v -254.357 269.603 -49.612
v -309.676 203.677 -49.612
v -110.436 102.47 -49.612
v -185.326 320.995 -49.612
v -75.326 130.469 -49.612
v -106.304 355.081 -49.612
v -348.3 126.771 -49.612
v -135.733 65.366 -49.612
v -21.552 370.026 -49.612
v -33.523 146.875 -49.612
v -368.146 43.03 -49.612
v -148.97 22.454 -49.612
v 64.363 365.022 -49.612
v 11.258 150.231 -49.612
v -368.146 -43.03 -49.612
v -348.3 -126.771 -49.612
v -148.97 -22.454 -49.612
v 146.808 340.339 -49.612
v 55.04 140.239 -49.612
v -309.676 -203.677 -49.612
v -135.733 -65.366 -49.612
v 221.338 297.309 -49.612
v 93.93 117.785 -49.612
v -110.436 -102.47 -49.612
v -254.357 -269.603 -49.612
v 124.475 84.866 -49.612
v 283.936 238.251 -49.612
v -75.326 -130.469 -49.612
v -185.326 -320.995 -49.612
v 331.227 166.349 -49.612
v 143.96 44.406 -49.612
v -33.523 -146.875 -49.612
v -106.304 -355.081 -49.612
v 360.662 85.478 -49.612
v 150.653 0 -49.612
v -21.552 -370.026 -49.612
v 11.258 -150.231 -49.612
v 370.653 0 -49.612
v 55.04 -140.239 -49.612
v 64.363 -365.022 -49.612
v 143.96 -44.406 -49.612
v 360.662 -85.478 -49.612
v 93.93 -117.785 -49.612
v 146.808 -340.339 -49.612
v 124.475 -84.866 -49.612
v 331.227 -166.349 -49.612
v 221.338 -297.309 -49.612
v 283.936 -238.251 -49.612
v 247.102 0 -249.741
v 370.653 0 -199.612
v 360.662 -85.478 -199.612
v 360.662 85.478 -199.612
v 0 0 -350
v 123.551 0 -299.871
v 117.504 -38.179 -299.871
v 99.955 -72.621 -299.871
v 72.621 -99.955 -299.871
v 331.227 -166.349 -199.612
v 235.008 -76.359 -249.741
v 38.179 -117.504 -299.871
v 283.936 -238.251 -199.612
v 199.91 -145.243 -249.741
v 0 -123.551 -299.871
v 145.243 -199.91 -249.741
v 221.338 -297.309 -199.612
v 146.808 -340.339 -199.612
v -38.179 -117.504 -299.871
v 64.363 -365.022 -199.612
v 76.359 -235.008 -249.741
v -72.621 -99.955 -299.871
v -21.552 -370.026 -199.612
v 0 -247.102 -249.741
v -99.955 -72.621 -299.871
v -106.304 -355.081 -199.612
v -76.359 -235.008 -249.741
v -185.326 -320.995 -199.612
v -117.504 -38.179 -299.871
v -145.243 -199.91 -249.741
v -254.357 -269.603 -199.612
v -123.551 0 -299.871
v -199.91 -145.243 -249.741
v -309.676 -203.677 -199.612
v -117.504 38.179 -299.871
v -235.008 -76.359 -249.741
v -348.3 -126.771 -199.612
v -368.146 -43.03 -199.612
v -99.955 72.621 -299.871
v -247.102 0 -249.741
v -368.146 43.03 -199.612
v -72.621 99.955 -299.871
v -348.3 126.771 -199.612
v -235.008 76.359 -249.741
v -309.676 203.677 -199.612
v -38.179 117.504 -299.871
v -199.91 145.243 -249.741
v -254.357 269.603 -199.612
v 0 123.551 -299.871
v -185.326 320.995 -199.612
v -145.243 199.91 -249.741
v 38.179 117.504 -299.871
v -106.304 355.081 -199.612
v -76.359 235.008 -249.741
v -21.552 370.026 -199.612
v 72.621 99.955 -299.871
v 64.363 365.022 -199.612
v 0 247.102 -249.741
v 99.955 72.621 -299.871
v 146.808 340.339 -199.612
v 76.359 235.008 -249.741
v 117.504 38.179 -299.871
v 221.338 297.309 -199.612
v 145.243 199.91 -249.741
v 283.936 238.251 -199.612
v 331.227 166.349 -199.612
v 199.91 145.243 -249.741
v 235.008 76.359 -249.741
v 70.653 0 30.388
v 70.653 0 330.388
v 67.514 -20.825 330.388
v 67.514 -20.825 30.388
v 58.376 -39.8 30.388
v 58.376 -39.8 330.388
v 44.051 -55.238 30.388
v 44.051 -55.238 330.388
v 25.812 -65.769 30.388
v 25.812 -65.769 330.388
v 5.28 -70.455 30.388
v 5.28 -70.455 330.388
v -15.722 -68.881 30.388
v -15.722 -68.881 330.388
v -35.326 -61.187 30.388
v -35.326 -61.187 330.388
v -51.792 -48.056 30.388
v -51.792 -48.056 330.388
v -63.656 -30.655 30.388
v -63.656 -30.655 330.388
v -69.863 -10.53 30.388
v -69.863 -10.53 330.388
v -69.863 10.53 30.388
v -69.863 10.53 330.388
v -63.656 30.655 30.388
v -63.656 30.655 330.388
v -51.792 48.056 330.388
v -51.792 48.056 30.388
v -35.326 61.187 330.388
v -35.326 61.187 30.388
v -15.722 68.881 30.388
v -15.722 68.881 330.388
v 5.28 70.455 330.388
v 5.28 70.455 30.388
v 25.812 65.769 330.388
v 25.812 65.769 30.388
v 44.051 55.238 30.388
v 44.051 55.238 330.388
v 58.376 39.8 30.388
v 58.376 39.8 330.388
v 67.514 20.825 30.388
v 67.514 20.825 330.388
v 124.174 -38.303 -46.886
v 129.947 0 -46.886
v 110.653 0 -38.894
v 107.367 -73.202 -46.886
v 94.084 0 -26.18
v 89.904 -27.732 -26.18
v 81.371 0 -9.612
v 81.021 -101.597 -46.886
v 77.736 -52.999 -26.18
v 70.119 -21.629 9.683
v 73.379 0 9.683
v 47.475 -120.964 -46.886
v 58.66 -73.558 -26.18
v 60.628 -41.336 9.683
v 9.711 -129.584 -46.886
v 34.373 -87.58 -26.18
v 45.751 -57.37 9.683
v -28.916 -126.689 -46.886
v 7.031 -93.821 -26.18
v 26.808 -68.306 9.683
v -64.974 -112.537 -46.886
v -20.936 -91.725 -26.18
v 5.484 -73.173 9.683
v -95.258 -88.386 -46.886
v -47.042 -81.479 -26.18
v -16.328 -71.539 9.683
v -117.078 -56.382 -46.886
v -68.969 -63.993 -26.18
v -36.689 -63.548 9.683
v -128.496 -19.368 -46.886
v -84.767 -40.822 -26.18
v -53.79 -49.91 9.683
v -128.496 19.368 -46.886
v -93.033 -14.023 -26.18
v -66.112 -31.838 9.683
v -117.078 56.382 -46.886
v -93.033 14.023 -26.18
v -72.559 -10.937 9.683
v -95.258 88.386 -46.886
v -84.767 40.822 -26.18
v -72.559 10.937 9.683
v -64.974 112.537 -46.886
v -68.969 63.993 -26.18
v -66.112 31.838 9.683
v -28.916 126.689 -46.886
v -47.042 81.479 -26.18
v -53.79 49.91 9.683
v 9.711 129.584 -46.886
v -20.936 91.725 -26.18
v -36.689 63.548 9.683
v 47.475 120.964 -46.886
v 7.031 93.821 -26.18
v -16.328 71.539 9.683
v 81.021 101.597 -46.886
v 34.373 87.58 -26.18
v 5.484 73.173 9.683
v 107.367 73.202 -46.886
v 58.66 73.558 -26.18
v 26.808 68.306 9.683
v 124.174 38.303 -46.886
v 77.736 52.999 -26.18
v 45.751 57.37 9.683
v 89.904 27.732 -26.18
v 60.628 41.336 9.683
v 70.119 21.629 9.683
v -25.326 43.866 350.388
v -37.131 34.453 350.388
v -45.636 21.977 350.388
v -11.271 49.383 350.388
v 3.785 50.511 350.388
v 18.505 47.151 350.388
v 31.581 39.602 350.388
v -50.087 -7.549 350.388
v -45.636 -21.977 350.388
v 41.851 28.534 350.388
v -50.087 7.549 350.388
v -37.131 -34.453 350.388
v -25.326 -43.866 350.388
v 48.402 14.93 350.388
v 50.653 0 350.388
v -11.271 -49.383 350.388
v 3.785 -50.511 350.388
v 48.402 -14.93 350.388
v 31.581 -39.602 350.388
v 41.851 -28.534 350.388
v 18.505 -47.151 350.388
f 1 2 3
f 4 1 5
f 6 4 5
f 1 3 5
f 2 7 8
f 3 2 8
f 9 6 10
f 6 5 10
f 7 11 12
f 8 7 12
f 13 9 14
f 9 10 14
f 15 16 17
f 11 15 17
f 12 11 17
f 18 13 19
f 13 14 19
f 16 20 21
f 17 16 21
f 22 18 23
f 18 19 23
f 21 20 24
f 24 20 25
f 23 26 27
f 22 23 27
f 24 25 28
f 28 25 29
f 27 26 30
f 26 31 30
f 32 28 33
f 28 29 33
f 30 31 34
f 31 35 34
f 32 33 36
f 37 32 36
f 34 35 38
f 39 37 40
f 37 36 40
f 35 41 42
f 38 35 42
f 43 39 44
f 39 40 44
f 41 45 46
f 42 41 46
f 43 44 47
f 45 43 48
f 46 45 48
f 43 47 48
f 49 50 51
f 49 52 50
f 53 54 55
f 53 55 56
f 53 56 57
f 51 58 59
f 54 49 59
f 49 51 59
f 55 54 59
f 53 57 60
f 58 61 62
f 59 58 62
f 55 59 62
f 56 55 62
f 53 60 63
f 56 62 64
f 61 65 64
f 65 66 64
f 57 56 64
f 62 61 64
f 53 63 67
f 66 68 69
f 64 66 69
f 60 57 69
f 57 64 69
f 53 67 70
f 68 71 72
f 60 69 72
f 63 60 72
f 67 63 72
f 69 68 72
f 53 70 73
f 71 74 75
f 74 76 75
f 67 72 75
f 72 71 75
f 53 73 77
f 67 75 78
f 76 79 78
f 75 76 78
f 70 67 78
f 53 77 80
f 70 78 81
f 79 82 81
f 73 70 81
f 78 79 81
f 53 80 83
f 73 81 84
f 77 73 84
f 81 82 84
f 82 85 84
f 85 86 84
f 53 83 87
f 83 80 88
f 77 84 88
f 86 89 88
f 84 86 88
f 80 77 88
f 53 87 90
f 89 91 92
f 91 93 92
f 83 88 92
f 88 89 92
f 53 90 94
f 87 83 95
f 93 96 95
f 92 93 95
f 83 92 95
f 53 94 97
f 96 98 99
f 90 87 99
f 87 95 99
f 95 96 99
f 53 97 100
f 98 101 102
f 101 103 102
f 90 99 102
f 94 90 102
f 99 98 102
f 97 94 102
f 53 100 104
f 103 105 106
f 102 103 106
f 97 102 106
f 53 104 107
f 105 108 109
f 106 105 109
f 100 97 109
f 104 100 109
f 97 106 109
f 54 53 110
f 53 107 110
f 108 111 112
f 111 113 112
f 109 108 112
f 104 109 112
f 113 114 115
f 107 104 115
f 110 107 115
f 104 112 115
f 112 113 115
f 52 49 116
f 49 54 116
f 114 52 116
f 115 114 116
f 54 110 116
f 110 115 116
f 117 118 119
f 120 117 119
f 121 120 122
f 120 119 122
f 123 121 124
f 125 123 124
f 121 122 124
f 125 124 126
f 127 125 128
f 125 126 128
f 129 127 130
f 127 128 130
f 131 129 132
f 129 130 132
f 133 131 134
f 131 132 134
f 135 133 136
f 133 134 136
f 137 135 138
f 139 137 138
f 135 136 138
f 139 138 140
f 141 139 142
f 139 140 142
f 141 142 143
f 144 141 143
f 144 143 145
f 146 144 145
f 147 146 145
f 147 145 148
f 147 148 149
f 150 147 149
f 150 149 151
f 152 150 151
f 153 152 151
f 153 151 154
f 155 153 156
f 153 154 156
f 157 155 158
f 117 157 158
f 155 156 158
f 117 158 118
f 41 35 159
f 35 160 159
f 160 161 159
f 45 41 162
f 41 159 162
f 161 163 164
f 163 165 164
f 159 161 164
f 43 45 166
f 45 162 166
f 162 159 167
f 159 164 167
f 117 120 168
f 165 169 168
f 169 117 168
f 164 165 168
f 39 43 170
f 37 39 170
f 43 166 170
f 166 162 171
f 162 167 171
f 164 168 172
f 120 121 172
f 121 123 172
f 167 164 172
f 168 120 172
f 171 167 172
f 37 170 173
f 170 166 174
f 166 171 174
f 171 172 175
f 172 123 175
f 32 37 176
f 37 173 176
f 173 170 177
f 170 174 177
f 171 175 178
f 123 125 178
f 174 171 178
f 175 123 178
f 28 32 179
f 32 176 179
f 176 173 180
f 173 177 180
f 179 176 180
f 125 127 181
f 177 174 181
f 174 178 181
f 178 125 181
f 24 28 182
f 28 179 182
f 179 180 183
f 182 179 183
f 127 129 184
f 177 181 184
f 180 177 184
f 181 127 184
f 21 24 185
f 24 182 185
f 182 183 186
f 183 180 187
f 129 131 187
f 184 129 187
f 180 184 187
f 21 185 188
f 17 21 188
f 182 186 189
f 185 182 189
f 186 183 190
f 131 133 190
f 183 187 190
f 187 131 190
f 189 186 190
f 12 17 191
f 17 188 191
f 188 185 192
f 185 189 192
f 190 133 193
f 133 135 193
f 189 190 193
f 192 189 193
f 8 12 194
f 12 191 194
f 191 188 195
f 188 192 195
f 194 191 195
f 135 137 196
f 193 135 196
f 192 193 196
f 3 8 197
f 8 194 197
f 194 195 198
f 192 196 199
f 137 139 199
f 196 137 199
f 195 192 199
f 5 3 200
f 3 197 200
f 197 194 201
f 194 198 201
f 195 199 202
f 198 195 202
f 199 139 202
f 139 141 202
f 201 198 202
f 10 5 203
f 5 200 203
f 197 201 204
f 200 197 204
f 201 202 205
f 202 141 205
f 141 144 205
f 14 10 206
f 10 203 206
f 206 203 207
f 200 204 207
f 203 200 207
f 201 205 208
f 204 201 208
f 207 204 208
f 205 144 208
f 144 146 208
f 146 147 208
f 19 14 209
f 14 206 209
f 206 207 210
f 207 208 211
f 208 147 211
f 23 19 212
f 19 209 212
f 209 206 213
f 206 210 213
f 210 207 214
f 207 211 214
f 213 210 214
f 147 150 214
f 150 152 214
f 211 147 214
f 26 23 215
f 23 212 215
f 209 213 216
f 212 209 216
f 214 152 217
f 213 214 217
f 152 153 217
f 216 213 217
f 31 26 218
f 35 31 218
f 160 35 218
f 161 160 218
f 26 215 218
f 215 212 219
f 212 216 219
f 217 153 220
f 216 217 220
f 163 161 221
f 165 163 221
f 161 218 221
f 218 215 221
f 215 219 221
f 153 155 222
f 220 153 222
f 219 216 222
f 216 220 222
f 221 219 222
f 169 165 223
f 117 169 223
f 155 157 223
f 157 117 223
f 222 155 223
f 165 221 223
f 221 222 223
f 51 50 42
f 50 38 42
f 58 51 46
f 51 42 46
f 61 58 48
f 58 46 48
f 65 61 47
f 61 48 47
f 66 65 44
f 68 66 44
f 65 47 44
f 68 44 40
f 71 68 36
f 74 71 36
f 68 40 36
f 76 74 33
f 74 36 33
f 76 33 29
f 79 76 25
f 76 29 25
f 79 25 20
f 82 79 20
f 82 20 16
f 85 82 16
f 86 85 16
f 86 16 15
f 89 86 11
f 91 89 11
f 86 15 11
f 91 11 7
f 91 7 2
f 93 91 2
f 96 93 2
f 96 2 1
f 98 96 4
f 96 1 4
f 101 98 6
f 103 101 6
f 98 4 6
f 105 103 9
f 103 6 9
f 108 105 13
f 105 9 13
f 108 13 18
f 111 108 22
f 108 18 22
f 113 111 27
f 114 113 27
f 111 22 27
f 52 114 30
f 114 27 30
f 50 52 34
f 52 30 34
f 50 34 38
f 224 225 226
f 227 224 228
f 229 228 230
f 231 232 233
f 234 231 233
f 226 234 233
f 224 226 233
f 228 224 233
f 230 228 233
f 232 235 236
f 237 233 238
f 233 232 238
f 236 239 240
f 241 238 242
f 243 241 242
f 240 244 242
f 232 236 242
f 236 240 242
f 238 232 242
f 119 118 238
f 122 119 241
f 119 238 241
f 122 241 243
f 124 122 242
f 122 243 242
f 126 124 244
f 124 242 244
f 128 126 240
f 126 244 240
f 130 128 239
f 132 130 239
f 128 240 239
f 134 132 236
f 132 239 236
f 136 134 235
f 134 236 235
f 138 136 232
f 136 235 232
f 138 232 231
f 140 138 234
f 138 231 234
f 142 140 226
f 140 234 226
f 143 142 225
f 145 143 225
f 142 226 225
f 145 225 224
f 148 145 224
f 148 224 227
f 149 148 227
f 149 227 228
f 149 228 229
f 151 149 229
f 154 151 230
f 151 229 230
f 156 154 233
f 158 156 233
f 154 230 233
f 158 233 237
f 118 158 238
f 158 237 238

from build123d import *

# Parameters (mm, degrees)
F2_SIZE = 20


with BuildPart() as f1:
    # F0 (on Front) → F1 (revolve)
    with BuildSketch(Plane.XZ):
        with BuildLine():
            Line((0, 350.3882980986), (0, -350))
            Line((0, -350), (370.6526133659, -199.6117019014))
            Line((370.6526133659, -199.6117019014), (370.6526133659, -49.6117019014))
            Line((370.6526133659, -49.6117019014), (150.6526133659, -49.6117019014))
            ThreePointArc((150.6526133659, -49.6117019014), (94.084070871, -26.1802443963), (70.6526133659, 30.3882980986))
            Line((70.6526133659, 30.3882980986), (70.6526133659, 350.3882980986))
            Line((70.6526133659, 350.3882980986), (0, 350.3882980986))
        make_face()
    revolve(axis=Axis((0, 0, 0.1941490493), (0, 0, -1)))

    # F2
    f2_edges = [f1.edges().sort_by_distance(p)[0] for p in [
        (-70.652613, 0, 350.388298),
    ]]
    chamfer(f2_edges, length=F2_SIZE)


solid = f1.part
